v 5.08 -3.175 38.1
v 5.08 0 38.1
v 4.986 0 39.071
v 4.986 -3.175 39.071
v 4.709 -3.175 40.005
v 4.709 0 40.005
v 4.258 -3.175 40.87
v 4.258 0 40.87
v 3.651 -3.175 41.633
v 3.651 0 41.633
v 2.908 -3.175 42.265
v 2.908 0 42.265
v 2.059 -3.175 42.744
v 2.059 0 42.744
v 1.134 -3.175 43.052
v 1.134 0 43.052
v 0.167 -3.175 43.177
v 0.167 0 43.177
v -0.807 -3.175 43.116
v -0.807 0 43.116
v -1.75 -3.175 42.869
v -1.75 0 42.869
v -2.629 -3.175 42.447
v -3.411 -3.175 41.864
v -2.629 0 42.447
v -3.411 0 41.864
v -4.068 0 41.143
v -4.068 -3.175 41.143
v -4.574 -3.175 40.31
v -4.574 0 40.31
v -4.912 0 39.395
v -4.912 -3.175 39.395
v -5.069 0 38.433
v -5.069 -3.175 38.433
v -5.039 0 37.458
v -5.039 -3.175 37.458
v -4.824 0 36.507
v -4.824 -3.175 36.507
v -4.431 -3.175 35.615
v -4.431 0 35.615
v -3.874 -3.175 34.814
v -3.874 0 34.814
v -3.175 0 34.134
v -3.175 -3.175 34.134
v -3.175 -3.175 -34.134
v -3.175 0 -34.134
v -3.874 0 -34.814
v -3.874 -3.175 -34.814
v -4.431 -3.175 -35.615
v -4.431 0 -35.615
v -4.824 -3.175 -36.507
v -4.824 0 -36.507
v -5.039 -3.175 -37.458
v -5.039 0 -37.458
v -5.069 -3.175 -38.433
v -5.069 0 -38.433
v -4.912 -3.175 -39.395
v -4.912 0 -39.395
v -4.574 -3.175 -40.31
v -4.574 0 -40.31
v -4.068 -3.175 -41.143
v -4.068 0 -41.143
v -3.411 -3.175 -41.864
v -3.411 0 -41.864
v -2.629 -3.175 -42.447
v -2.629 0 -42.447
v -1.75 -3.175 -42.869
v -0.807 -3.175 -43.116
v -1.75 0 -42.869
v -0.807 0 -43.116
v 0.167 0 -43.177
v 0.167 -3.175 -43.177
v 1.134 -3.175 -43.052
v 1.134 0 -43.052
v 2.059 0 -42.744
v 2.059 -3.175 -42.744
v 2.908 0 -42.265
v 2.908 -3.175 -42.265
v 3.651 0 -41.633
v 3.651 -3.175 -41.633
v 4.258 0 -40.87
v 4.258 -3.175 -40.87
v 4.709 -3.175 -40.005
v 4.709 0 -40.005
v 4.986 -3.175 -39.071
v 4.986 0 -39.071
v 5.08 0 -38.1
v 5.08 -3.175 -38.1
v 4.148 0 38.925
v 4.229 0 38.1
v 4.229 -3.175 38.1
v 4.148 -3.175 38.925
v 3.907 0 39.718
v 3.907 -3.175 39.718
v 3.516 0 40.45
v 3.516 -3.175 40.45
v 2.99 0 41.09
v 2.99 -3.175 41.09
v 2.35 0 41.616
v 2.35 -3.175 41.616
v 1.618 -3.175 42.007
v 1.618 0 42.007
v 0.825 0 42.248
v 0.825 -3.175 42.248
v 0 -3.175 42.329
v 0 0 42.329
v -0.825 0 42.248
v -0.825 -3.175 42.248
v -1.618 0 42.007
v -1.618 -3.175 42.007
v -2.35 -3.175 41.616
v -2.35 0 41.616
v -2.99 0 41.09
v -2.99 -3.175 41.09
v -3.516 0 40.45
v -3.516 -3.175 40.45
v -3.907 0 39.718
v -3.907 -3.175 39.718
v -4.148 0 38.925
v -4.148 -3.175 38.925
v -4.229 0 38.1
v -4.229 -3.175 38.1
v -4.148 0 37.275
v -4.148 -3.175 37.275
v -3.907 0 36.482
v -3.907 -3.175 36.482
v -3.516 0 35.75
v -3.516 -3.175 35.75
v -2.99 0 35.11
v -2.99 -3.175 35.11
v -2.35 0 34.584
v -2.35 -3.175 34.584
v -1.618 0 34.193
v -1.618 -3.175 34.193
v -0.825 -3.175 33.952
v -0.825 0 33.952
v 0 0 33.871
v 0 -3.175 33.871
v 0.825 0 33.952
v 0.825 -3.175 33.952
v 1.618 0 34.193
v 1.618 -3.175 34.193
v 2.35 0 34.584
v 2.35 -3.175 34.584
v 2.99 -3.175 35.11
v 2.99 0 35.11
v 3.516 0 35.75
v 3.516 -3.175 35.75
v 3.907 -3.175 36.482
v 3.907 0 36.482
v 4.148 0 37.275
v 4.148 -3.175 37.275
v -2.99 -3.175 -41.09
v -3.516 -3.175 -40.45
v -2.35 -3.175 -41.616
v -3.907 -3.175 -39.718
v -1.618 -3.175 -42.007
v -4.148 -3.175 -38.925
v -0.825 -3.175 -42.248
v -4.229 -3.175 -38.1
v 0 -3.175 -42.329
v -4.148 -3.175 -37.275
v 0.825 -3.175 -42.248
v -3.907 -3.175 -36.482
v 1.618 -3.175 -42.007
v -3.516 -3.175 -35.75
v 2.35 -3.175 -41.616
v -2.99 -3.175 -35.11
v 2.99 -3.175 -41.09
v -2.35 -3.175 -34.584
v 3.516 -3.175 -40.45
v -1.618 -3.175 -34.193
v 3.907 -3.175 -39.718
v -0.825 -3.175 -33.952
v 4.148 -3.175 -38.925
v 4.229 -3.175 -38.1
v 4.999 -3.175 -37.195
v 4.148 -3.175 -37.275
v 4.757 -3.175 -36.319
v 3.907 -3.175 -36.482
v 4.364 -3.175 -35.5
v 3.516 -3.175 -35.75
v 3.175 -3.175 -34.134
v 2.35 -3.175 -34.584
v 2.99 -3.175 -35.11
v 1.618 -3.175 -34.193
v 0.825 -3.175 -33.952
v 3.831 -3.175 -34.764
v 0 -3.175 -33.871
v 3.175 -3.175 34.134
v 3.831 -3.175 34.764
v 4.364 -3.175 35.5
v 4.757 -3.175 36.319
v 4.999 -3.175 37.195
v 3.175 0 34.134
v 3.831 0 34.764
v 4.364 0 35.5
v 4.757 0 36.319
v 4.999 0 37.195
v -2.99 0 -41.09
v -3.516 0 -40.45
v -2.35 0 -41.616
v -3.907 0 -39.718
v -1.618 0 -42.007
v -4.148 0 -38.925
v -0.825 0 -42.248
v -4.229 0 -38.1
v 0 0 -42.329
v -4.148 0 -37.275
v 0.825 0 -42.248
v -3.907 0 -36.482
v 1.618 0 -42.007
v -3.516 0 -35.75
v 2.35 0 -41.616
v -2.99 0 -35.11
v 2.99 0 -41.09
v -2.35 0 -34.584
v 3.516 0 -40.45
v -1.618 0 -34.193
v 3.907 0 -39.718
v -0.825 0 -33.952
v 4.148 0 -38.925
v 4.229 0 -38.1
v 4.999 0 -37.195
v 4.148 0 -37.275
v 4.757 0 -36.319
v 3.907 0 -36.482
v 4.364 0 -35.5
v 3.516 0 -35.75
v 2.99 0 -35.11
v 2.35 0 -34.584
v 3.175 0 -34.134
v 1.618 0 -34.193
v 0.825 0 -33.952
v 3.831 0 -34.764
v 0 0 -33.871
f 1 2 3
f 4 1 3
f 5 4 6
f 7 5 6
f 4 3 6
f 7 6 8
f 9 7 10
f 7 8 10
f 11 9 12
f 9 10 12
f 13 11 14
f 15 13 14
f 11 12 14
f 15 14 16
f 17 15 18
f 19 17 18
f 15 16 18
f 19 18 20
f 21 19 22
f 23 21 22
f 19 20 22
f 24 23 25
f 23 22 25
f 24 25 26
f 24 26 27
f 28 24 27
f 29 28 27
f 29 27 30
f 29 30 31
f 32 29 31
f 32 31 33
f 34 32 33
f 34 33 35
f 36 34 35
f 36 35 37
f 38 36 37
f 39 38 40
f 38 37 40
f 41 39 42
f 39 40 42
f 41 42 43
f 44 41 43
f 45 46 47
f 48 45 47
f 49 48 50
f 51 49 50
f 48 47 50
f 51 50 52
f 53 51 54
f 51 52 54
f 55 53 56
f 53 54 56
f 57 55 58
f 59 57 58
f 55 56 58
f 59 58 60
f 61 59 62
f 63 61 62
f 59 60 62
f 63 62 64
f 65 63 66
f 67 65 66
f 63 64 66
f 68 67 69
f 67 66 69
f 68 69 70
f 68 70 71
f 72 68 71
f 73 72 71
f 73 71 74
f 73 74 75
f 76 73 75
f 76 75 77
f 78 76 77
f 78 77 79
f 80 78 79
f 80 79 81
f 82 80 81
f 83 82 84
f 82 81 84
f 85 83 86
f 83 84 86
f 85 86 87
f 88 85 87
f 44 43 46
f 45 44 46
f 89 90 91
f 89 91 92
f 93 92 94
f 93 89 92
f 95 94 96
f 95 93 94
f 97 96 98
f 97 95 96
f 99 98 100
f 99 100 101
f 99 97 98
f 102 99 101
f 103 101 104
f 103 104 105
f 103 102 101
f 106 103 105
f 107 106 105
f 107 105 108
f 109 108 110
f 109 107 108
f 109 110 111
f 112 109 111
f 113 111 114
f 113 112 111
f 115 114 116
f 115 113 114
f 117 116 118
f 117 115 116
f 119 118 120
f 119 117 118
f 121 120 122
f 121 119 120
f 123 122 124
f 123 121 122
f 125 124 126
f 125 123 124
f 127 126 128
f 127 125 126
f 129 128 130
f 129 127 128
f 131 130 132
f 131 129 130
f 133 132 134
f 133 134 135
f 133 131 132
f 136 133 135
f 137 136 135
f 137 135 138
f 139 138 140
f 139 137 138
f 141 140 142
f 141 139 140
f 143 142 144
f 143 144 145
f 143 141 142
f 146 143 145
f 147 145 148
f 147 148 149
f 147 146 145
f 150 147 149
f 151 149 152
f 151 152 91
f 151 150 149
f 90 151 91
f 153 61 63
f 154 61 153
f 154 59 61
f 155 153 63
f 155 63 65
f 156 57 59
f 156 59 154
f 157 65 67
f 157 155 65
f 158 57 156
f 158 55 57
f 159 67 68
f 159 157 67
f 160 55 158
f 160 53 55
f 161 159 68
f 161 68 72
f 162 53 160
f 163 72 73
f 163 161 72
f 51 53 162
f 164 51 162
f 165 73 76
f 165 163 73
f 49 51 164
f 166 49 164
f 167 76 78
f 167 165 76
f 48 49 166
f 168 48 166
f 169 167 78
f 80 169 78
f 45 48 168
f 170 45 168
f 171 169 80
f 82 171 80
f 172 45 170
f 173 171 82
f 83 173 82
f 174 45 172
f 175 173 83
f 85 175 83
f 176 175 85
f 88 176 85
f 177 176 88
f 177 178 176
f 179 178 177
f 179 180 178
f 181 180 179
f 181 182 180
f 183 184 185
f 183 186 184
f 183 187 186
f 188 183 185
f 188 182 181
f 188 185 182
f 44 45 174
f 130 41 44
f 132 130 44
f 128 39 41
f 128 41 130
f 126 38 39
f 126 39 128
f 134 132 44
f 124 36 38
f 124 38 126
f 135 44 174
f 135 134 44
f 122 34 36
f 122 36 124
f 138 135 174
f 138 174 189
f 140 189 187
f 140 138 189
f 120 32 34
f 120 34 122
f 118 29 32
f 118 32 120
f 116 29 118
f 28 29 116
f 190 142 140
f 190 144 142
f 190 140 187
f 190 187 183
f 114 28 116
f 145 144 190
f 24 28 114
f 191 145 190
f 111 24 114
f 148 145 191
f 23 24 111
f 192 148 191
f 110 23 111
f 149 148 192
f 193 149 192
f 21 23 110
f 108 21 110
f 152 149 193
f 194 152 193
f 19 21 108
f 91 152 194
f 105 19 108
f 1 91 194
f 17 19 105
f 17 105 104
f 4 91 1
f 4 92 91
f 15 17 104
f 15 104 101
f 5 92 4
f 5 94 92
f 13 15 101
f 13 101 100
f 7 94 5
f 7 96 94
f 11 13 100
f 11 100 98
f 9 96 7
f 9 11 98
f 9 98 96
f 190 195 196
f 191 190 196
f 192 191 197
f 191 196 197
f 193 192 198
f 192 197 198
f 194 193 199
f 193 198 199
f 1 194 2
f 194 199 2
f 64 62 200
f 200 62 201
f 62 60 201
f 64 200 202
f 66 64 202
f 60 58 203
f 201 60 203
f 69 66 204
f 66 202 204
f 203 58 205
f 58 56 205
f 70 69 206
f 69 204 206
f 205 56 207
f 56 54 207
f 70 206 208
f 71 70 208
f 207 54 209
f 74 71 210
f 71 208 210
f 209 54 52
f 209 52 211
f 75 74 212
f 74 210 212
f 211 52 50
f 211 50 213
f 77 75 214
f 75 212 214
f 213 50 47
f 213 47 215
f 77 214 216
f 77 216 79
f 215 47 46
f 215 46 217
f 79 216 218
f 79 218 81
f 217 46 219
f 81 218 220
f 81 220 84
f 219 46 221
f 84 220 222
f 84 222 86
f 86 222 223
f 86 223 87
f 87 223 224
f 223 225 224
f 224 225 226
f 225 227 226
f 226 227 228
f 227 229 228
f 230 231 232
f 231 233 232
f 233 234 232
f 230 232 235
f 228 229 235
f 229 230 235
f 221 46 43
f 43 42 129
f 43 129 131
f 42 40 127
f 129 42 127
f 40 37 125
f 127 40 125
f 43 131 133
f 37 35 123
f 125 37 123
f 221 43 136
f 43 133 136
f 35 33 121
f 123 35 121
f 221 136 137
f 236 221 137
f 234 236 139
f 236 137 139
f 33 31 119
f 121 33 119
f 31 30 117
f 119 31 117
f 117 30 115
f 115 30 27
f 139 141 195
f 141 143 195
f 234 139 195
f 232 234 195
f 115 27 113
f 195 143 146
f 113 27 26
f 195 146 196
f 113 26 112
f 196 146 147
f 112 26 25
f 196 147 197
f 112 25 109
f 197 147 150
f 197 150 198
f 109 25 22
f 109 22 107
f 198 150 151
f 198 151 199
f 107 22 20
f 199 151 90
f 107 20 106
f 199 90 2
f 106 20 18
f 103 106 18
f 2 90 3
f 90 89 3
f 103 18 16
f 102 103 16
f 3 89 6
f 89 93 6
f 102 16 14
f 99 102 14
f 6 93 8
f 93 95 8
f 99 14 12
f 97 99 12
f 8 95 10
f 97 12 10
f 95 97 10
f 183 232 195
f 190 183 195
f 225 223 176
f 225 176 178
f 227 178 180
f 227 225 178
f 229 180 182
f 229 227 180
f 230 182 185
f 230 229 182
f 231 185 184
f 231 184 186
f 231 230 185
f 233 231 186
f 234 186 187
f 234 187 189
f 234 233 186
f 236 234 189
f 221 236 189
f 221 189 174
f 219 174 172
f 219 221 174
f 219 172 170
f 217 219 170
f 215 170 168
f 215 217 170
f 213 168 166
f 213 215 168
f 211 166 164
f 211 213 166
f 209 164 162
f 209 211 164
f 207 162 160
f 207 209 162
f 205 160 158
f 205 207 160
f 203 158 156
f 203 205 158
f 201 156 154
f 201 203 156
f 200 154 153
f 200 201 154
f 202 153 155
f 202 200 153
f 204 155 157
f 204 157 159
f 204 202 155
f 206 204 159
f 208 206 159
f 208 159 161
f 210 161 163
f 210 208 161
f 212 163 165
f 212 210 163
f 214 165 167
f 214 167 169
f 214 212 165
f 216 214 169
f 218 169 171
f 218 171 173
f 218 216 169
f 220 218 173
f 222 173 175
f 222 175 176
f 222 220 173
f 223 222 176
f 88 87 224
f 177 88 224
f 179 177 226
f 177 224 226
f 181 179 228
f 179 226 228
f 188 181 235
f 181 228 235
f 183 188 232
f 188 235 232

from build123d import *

# Parameters (mm, degrees)
F0_R     = 4.2291
F1_DEPTH = 3.175


with BuildPart() as f1:
    # F0 (on Front) → F1 (new body)
    with BuildSketch(Plane.XZ):
        with BuildLine():
            ThreePointArc((-3.175, -34.134426), (0, -33.02), (3.175, -34.134426))
            Line((3.175, -34.134426), (3.175, 0))
            Line((3.175, 0), (-3.175, 0))
            Line((-3.175, 0), (-3.175, -34.134426))
        make_face()
        with BuildLine():
            ThreePointArc((5.08, -38.1), (4.57905, -35.900295), (3.175, -34.134426))
            ThreePointArc((3.175, -34.134426), (0, -33.02), (-3.175, -34.134426))
            ThreePointArc((-3.175, -34.134426), (-2.199705, -42.67905), (5.08, -38.1))
        make_face()
        with Locations((0, -38.1)):
            Circle(F0_R, mode=Mode.SUBTRACT)
        with BuildLine():
            Line((-3.175, 0), (3.175, 0))
            Line((3.175, 0), (3.175, 34.134426))
            ThreePointArc((3.175, 34.134426), (0, 33.02), (-3.175, 34.134426))
            Line((-3.175, 34.134426), (-3.175, 0))
        make_face()
        with BuildLine():
            ThreePointArc((-3.175, 34.134426), (0, 33.02), (3.175, 34.134426))
            ThreePointArc((3.175, 34.134426), (4.57905, 35.900295), (5.08, 38.1))
            ThreePointArc((5.08, 38.1), (-2.199705, 42.67905), (-3.175, 34.134426))
        make_face()
        with Locations((0, 38.1)):
            Circle(F0_R, mode=Mode.SUBTRACT)
    extrude(amount=F1_DEPTH)


solid = f1.part
